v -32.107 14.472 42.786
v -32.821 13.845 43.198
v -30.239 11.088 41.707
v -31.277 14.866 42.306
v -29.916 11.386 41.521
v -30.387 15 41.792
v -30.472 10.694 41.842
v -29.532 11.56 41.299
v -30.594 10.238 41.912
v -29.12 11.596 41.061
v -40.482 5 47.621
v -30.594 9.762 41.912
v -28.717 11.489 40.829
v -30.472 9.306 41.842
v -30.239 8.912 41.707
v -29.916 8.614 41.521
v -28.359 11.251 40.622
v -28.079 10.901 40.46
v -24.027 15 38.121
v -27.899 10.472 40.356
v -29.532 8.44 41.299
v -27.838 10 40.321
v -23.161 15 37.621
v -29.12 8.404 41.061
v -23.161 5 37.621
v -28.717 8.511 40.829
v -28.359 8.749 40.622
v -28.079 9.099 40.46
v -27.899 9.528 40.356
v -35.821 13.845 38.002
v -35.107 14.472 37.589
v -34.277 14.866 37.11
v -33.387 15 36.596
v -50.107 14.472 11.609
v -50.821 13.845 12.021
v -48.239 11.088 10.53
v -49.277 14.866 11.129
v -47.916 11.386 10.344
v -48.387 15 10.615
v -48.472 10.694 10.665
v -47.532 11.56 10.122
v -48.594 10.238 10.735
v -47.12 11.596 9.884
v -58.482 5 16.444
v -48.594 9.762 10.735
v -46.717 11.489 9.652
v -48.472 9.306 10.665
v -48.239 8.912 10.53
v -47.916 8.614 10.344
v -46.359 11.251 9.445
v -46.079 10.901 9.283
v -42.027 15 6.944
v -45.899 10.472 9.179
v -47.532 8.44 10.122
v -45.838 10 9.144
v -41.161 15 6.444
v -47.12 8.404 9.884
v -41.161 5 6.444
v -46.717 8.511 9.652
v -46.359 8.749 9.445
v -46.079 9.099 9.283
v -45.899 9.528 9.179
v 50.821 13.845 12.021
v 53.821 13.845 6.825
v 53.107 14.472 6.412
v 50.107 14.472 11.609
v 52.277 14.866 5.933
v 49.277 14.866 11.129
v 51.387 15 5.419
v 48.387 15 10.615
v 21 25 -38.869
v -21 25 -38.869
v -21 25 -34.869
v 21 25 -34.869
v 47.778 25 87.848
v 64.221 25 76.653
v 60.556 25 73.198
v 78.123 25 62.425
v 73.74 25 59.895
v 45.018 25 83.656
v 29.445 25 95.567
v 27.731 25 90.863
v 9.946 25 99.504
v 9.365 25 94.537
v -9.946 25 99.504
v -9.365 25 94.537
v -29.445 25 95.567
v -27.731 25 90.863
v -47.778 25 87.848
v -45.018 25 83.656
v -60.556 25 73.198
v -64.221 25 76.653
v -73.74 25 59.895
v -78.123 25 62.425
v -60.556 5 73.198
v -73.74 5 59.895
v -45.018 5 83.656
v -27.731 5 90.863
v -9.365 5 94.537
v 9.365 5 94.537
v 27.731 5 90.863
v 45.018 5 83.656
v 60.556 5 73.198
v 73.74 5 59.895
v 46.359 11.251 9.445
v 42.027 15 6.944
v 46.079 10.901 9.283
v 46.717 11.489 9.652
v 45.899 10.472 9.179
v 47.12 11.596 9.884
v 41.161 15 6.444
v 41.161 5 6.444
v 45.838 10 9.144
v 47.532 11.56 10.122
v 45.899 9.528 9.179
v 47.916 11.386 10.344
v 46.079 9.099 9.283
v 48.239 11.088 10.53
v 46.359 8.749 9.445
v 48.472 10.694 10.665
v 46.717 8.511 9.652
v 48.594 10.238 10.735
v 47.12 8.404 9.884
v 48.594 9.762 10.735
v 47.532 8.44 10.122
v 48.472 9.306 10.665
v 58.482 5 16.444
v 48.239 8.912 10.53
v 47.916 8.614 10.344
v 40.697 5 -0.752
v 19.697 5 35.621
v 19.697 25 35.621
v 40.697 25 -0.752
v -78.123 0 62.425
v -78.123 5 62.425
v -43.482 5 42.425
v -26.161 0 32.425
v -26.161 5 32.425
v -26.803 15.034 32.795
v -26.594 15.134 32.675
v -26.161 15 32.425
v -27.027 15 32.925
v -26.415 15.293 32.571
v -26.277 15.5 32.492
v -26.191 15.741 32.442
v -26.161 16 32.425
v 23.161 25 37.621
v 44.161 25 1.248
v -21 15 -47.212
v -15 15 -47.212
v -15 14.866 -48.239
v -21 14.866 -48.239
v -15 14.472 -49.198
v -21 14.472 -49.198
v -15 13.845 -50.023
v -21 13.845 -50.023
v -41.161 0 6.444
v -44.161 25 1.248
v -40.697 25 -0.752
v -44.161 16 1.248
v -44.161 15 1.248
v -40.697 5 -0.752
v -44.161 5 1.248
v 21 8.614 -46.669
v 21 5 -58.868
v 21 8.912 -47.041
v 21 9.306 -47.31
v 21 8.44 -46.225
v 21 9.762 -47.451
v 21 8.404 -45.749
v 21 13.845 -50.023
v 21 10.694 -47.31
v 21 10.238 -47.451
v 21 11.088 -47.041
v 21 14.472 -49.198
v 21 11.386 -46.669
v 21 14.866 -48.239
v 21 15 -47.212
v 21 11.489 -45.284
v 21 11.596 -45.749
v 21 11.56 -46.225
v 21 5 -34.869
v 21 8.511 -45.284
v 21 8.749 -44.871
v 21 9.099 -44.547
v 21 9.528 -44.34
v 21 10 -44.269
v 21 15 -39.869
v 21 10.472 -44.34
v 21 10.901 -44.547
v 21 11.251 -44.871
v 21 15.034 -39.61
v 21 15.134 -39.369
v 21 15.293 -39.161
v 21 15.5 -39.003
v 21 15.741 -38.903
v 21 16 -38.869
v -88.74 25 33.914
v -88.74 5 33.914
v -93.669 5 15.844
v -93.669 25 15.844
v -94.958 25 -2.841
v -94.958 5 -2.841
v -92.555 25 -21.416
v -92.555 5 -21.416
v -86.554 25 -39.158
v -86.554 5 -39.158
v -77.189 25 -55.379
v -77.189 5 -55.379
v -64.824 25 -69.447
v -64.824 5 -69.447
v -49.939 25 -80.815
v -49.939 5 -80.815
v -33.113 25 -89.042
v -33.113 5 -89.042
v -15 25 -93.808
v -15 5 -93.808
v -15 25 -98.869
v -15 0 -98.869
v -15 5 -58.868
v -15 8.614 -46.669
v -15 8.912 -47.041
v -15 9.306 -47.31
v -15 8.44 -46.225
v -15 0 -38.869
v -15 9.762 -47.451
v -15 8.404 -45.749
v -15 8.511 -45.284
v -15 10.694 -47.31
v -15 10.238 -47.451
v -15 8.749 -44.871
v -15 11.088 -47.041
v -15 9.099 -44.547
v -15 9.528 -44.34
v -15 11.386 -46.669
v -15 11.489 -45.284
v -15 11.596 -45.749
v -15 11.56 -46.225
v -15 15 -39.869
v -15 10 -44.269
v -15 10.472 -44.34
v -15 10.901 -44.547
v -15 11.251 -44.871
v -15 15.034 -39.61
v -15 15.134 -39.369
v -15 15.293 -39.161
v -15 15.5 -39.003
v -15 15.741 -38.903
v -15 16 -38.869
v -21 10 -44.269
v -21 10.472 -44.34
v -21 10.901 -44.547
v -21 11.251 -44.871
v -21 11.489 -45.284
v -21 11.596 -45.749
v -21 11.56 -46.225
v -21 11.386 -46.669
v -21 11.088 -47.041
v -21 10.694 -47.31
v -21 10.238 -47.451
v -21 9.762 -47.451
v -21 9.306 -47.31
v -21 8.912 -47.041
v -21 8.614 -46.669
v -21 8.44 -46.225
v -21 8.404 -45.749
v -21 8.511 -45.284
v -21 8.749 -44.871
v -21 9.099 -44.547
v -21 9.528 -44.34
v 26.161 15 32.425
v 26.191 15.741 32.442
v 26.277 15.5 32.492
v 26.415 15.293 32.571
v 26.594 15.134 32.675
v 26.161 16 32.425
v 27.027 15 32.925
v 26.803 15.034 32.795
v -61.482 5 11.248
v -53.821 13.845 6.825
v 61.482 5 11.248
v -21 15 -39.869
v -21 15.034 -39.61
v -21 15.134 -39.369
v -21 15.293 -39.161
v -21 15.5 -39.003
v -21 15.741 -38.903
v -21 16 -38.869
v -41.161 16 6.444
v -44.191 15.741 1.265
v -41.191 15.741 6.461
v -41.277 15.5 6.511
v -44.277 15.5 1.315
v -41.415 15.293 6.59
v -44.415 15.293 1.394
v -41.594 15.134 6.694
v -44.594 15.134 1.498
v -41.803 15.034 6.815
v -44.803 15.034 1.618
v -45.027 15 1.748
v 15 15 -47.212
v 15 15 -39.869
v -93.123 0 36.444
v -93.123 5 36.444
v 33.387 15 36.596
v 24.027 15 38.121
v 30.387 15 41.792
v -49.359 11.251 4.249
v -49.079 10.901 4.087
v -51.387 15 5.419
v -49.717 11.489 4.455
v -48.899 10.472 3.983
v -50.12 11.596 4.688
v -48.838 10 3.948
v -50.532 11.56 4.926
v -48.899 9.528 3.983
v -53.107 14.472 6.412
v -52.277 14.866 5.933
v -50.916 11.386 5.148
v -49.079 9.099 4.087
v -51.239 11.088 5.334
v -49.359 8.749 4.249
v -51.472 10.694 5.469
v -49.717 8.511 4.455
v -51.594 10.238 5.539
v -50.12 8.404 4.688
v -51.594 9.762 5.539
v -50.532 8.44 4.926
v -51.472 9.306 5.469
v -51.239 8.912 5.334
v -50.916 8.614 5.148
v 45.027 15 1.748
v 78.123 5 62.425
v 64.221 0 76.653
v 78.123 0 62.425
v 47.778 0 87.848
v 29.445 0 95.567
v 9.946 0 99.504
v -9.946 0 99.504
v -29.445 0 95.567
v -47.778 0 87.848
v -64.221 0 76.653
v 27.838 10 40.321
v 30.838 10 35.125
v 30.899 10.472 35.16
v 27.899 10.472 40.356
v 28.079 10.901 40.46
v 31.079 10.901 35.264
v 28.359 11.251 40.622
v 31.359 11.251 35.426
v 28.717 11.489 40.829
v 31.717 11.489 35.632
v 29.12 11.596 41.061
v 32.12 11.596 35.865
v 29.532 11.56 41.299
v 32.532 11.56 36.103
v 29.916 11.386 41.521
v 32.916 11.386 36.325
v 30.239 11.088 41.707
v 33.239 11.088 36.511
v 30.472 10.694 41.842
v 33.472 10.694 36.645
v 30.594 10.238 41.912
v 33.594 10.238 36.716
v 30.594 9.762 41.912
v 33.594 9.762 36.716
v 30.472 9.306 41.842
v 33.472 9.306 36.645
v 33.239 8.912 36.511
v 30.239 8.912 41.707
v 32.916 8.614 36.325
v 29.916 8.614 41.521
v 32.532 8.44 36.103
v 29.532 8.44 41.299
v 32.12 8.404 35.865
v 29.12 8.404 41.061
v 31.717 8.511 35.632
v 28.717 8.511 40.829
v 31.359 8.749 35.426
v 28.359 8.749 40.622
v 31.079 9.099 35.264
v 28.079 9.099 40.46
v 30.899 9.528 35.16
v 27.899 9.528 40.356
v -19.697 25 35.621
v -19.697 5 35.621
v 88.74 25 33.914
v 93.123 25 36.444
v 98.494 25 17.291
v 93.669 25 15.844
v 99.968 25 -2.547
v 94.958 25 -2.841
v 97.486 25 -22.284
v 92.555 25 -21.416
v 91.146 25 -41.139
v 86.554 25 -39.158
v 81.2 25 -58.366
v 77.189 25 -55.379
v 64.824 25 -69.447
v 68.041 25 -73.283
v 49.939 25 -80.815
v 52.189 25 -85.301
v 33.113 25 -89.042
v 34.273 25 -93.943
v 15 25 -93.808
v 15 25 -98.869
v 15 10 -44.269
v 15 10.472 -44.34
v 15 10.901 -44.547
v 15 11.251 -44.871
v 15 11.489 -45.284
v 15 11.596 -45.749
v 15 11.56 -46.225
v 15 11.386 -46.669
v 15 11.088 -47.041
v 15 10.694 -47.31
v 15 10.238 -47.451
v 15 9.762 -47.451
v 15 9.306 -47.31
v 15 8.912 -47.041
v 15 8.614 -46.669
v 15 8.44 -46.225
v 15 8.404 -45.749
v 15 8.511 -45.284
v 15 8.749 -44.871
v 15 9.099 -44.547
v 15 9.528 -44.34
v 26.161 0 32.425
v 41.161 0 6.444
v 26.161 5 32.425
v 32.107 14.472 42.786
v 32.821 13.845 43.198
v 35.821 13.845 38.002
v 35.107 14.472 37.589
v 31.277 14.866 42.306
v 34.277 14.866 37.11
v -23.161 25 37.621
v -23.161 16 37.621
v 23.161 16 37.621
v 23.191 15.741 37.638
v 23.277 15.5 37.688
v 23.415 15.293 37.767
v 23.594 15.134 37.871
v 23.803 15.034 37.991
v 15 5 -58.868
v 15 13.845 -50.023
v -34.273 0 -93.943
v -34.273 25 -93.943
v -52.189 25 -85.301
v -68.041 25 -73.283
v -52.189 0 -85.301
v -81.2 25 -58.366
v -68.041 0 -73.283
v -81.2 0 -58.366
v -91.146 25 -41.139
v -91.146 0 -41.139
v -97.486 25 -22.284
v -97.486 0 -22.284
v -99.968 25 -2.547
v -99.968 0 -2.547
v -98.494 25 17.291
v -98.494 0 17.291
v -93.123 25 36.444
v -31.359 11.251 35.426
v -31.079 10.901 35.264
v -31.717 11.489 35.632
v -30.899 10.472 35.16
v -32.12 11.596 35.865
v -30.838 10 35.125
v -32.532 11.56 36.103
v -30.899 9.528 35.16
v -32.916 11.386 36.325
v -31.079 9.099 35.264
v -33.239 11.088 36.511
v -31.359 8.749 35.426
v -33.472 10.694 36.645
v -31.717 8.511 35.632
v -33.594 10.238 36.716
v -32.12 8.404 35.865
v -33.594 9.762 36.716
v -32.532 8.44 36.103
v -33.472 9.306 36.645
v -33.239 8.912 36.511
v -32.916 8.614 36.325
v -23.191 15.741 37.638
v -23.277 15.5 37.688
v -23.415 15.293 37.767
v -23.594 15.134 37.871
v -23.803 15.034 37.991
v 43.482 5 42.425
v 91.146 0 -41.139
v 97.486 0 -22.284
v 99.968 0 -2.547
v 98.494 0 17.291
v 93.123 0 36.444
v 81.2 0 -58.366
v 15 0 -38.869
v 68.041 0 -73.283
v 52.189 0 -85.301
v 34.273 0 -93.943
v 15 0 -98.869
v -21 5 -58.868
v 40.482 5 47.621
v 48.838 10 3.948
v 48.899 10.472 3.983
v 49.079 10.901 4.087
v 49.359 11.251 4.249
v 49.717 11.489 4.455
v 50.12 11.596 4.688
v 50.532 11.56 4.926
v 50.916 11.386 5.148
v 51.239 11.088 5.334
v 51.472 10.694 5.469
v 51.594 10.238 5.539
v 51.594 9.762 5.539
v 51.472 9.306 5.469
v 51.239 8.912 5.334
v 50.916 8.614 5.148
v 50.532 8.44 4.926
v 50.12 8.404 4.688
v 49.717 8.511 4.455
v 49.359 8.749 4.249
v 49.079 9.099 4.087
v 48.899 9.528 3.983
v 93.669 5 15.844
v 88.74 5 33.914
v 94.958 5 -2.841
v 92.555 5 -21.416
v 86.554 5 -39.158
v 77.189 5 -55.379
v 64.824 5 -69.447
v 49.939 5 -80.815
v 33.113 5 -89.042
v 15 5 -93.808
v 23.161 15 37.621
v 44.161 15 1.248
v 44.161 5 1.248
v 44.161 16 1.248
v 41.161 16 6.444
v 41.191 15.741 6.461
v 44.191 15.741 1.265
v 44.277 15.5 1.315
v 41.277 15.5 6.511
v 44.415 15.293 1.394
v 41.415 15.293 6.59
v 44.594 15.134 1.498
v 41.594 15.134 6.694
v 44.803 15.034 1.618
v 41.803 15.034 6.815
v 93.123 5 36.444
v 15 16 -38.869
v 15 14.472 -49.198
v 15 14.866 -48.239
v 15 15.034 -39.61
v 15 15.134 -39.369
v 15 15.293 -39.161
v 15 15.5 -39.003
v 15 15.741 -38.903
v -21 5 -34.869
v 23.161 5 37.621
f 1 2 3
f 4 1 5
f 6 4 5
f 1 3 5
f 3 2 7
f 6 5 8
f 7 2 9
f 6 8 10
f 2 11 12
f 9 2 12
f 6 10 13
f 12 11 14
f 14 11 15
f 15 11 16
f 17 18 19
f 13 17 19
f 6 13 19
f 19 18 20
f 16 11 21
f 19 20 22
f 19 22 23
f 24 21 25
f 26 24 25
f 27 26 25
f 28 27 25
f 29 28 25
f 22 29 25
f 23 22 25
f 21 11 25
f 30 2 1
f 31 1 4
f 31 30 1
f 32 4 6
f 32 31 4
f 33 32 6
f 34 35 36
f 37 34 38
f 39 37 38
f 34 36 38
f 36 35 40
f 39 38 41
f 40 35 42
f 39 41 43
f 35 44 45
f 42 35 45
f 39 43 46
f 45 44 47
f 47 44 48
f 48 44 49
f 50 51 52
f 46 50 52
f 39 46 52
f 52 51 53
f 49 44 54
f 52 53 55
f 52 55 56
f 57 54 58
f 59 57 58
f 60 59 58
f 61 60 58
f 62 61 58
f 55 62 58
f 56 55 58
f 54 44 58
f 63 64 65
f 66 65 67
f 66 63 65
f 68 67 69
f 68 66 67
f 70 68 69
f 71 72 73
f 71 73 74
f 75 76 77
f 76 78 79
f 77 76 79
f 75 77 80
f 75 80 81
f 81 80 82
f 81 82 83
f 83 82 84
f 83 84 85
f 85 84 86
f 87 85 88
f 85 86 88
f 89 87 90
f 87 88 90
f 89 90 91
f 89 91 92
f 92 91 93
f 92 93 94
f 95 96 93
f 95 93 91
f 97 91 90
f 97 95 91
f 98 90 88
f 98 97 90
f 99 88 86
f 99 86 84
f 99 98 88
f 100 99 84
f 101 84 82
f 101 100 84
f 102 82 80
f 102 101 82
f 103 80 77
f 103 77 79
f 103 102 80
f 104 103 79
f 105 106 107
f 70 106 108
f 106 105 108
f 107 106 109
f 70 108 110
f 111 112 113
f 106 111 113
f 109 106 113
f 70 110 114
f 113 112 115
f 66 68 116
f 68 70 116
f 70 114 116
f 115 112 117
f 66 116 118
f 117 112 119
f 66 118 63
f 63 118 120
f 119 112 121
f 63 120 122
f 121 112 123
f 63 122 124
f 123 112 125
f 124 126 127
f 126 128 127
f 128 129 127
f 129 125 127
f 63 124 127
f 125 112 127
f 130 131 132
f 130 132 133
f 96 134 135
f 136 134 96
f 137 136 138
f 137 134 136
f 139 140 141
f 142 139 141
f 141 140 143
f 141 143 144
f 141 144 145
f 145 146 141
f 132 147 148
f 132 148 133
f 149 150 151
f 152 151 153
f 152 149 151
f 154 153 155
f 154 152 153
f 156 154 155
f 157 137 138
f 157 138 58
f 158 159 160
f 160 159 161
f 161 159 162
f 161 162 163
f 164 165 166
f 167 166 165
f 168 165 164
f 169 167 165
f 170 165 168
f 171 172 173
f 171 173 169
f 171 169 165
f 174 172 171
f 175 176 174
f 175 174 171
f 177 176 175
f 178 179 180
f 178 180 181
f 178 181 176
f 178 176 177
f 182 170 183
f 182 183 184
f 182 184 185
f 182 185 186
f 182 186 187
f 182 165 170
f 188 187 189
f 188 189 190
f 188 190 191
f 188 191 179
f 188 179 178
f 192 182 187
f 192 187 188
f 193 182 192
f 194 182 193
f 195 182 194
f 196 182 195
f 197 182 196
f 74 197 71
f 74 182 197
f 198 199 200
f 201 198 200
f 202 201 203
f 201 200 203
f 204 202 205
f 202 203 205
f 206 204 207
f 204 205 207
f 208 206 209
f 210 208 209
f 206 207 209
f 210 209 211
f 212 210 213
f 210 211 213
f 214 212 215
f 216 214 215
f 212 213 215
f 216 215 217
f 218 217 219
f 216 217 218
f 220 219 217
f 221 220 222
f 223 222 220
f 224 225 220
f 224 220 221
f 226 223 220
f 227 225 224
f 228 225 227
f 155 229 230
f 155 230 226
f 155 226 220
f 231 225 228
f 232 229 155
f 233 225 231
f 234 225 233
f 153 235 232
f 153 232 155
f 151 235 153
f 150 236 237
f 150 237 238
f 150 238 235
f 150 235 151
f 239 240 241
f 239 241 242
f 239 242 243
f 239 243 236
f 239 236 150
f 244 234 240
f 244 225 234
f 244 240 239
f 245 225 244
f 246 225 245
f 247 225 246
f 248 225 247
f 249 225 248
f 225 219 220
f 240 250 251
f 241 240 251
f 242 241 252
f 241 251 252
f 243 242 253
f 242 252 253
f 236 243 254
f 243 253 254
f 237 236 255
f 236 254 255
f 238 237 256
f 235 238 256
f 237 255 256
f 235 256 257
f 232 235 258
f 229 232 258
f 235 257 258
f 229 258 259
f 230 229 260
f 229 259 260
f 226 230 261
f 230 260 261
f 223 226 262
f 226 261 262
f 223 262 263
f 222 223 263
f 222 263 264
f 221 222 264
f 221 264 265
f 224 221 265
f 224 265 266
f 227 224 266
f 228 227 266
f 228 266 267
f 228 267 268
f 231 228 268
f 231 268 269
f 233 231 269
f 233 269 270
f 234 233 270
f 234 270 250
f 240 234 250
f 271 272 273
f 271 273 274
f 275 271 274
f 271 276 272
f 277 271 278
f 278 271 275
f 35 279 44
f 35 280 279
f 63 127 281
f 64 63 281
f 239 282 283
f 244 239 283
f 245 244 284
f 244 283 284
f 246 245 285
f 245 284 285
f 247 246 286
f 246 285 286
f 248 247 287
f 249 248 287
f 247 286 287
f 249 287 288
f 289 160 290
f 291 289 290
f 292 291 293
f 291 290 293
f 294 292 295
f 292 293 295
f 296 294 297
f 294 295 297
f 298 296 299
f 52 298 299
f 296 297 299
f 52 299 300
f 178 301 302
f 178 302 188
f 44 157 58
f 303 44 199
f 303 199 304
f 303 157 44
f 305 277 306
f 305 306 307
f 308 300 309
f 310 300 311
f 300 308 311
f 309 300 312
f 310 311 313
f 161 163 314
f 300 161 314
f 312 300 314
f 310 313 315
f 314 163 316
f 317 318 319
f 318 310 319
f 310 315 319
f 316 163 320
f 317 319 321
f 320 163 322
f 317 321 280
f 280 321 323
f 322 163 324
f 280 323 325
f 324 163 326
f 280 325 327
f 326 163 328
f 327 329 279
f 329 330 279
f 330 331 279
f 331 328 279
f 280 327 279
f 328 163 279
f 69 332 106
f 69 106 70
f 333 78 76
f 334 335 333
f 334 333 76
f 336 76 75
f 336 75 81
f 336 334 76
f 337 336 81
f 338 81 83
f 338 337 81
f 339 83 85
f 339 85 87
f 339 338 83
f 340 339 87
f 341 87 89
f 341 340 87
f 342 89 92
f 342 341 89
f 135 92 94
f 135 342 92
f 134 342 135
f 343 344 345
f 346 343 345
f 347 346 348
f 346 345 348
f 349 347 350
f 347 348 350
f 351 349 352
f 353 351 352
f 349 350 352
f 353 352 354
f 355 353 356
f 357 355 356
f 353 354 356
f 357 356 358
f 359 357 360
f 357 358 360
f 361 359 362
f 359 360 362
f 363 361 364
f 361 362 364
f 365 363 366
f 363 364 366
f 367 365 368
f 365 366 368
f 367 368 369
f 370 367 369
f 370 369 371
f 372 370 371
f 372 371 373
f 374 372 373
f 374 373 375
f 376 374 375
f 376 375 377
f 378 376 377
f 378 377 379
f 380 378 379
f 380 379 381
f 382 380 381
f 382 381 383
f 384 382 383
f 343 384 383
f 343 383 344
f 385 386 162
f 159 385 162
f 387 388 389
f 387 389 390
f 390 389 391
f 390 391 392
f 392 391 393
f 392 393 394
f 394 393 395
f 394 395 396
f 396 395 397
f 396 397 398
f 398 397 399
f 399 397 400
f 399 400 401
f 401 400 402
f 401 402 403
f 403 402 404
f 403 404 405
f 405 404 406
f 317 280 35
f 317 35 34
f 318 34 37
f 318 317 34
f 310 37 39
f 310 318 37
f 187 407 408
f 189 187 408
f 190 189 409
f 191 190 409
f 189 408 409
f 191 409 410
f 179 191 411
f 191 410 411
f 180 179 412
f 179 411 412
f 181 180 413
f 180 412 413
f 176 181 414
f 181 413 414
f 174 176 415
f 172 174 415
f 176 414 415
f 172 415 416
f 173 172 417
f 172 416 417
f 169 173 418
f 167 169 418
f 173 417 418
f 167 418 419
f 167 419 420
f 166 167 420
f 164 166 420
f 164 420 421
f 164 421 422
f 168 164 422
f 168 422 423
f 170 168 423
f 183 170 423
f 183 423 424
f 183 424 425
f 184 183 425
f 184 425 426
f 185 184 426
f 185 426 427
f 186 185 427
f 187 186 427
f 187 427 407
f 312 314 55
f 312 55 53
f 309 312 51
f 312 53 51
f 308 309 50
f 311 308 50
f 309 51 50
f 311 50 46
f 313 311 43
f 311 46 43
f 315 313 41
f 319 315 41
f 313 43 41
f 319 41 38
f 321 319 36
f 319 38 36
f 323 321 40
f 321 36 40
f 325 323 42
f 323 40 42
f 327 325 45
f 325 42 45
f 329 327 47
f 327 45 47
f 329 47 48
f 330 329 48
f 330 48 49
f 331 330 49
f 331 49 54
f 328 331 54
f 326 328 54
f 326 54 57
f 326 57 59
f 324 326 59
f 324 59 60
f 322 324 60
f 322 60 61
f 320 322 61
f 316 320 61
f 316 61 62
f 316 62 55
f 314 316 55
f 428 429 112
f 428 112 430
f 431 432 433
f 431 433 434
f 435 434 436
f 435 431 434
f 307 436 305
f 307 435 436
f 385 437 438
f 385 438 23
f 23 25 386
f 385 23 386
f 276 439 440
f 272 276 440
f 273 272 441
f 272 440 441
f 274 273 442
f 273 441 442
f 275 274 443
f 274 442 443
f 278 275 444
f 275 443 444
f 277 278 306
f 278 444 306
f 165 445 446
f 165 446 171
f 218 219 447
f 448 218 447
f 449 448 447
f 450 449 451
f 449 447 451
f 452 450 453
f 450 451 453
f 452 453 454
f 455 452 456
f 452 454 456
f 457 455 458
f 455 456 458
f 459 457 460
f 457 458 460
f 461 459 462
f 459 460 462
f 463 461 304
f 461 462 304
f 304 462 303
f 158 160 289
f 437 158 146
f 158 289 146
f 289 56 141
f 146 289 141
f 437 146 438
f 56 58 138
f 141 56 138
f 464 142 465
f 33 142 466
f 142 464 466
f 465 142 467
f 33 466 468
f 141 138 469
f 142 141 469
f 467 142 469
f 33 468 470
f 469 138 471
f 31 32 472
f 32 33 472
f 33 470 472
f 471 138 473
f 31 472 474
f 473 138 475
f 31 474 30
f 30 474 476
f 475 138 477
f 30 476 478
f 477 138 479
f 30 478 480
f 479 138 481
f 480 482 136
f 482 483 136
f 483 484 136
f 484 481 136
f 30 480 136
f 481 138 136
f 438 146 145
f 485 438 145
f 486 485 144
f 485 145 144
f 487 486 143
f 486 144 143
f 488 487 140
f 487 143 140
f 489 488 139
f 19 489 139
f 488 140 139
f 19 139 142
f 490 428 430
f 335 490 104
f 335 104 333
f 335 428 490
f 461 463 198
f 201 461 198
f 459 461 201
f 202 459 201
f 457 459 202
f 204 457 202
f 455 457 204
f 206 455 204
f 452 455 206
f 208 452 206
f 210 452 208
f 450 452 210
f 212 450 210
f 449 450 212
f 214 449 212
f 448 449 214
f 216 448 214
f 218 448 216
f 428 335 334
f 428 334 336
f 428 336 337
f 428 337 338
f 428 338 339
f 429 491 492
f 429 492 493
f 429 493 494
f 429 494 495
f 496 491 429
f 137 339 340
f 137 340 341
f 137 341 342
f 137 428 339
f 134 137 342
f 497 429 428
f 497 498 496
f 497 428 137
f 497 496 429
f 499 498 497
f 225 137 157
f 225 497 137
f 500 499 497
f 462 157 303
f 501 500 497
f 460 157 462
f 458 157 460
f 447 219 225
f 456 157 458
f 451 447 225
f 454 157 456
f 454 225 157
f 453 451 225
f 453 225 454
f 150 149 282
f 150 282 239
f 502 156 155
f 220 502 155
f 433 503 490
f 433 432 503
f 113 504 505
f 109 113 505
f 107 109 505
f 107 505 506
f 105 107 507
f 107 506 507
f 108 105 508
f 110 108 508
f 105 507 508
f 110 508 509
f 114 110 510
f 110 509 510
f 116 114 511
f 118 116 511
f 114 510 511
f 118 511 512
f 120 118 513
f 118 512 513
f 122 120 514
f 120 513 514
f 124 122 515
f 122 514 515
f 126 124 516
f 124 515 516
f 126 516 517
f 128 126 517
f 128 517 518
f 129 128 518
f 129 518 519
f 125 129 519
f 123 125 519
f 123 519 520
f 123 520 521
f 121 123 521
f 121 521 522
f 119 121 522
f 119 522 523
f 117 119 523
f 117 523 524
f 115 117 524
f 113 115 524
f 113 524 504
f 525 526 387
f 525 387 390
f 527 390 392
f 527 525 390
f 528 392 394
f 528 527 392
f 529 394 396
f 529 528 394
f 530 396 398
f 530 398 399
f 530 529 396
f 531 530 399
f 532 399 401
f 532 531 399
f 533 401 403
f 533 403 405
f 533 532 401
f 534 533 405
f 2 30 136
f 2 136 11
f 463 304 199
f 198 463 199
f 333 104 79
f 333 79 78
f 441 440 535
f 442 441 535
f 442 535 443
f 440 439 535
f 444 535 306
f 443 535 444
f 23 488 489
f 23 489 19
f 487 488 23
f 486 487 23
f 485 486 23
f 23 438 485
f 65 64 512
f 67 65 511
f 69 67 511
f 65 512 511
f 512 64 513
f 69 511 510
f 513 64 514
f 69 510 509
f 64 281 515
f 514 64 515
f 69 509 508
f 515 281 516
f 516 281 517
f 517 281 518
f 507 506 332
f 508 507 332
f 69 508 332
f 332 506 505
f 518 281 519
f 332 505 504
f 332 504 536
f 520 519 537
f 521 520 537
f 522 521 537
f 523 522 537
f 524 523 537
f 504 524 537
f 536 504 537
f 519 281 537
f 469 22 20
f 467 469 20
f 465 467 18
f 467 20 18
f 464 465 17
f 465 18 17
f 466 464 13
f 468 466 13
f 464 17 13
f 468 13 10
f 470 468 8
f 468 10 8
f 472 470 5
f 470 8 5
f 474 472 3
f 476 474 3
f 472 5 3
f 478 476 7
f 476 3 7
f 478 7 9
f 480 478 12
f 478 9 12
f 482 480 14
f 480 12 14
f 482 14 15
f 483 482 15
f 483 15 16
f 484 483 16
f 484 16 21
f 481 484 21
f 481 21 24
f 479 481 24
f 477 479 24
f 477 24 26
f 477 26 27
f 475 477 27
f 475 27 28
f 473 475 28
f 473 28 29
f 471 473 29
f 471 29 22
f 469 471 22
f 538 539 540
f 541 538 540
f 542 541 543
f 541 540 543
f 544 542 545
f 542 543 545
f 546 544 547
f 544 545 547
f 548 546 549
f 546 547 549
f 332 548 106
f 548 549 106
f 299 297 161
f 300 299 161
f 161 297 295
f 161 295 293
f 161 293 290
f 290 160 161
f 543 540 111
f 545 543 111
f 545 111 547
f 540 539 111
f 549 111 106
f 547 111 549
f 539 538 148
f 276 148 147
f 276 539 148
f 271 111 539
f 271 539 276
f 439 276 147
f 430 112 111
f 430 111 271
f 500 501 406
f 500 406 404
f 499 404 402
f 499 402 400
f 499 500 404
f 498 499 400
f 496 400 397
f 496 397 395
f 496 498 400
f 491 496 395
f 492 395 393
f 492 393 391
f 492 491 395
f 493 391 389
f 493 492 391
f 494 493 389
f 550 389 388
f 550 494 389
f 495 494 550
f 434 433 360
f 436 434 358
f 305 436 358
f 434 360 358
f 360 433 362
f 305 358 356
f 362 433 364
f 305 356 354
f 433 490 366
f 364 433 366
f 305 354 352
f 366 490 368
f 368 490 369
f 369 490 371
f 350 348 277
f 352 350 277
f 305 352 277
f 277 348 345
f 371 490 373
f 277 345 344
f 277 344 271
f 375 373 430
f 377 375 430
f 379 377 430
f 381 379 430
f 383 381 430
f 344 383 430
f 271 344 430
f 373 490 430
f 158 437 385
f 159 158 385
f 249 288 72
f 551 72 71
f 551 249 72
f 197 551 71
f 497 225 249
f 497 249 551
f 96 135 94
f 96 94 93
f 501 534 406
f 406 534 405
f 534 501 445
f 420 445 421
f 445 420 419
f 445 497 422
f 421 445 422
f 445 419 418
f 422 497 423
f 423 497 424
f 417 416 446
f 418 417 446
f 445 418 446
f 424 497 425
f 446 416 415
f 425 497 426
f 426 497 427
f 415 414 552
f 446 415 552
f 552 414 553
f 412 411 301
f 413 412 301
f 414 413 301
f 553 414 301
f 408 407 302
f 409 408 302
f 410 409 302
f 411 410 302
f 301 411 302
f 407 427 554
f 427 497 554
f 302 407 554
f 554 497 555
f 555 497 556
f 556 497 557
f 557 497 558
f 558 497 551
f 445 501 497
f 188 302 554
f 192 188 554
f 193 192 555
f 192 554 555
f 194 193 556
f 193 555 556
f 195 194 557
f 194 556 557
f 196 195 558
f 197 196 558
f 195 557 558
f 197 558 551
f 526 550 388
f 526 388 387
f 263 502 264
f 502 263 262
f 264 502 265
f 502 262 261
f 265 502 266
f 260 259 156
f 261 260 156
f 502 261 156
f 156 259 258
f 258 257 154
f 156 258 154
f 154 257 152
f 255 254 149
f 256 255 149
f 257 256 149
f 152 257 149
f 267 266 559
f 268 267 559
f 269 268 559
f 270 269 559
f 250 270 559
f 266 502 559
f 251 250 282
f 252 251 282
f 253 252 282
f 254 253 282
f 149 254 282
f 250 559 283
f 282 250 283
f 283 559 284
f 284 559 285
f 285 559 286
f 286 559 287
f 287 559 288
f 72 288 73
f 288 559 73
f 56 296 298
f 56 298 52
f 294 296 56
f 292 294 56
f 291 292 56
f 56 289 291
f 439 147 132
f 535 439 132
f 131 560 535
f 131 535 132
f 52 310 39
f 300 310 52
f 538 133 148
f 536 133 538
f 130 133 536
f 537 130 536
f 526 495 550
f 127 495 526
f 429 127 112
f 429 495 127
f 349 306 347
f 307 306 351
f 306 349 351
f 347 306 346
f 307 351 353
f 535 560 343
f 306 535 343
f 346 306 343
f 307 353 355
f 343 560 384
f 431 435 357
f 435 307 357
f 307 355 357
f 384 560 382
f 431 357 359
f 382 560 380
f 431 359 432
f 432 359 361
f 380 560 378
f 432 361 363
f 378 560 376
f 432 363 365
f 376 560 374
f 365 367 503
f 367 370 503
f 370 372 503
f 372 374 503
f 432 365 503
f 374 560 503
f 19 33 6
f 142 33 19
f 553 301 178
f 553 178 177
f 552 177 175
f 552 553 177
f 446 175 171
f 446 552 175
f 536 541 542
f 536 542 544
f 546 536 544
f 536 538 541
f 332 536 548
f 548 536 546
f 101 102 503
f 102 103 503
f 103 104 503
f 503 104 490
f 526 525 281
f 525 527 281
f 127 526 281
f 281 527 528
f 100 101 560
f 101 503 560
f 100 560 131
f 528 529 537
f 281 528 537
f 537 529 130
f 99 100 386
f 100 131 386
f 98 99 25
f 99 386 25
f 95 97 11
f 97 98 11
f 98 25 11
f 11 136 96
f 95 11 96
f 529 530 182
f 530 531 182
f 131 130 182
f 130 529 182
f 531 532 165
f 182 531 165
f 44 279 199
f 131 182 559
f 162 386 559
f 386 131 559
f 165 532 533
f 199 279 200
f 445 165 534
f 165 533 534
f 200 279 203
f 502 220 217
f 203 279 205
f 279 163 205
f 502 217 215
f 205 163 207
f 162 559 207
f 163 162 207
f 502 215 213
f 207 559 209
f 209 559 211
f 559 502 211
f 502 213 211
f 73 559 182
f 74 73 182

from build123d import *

# Parameters (mm, degrees)
AUFSATZ_LINEAR_AUSTRAGEN1_DEPTH = 5
SKIZZE2_W                       = 6
SKIZZE2_H                       = 10
AUFSATZ_LINEAR_AUSTRAGEN2_DEPTH = 10
FASE1_SIZE                      = 10
SKIZZE3_R                       = 1.6
SCHNITT_LINEAR_AUSTRAGEN1_DEPTH = 42
SKIZZE4_W                       = 42
SKIZZE4_H                       = 4
AUFSATZ_LINEAR_AUSTRAGEN3_DEPTH = 20
KREISMUSTER1_COUNT              = 3
VERRUNDUNG1_START               = -21
VERRUNDUNG1_DEPTH               = 6
VERRUNDUNG1_START_2             = 15
VERRUNDUNG1_2_DEPTH             = 6
VERRUNDUNG1_3_DEPTH             = 6
VERRUNDUNG1_4_DEPTH             = 6
VERRUNDUNG1_5_DEPTH             = 6
VERRUNDUNG1_6_DEPTH             = 6
VERRUNDUNG1_START_3             = -22
VERRUNDUNG1_7_DEPTH             = 44
VERRUNDUNG1_8_DEPTH             = 44
VERRUNDUNG1_9_DEPTH             = 44


with BuildPart() as part:
    # Skizze1 → Aufsatz-Linear austragen1 (new body)
    with BuildSketch(Plane(origin=(0, 0, 0), x_dir=(1, 0, 0), z_dir=(0, 1, 0))):
        with BuildLine():
            Line((93.122718948, -36.443918776), (41.161194721, -6.443918776))
            Line((41.161194721, -6.443918776), (26.161194721, -32.42468089))
            Line((26.161194721, -32.42468089), (78.122718948, -62.42468089))
            ThreePointArc((78.122718948, -62.42468089), (0, -100), (-78.122718948, -62.42468089))
            Line((-78.122718948, -62.42468089), (-26.161194721, -32.42468089))
            Line((-26.161194721, -32.42468089), (-41.161194721, -6.443918776))
            Line((-41.161194721, -6.443918776), (-93.122718948, -36.443918776))
            ThreePointArc((-93.122718948, -36.443918776), (-86.602540378, 50), (-15, 98.868599666))
            Line((-15, 98.868599666), (-15, 38.868599666))
            Line((-15, 38.868599666), (15, 38.868599666))
            Line((15, 38.868599666), (15, 98.868599666))
            ThreePointArc((15, 98.868599666), (86.602540378, 50), (93.122718948, -36.443918776))
        make_face()
    extrude(amount=AUFSATZ_LINEAR_AUSTRAGEN1_DEPTH)

    # Skizze2 → Aufsatz-Linear austragen2 (add)
    with BuildSketch(Plane(origin=(0, 5, 0), x_dir=(1, 0, 0), z_dir=(0, 1, 0))):
        Polygon((49.821448758, -11.443918776), (52.821448758, -6.247766354), (44.161194721, -1.247766354), (41.161194721, -6.443918776), align=None)
        with Locations((-18, 43.868599666)):
            Rectangle(SKIZZE2_W, SKIZZE2_H)
        with Locations((18, 43.868599666)):
            Rectangle(SKIZZE2_W, SKIZZE2_H)
        Polygon((26.161194721, -32.42468089), (23.161194721, -37.620833313), (31.821448758, -42.620833313), (34.821448758, -37.42468089), align=None)
        Polygon((-34.821448758, -37.42468089), (-31.821448758, -42.620833313), (-23.161194721, -37.620833313), (-26.161194721, -32.42468089), align=None)
        Polygon((-41.161194721, -6.443918776), (-44.161194721, -1.247766354), (-52.821448758, -6.247766354), (-49.821448758, -11.443918776), align=None)
    extrude(amount=AUFSATZ_LINEAR_AUSTRAGEN2_DEPTH)

    # Fase1
    fase1_edges = [part.edges().sort_by_distance(p)[0] for p in [
        (-18, 5, -48.868599666),
        (18, 5, -48.868599666),
        (51.321448758, 5, 8.845842565),
        (33.321448758, 5, 40.022757101),
        (-33.321448758, 5, 40.022757101),
        (-51.321448758, 5, 8.845842565),
    ]]
    chamfer(fase1_edges, length=FASE1_SIZE - 0.0001)  # a hair under: the kernel refuses the full size

    # Skizze3 → Schnitt-Linear austragen1 (cut)
    with BuildSketch(Plane(origin=(10.5, 0, 18.186533479), x_dir=(0.8660254037844384, 0, -0.5000000000000007), z_dir=(0.5000000000000006, 0, 0.8660254037844383))):
        with Locations((-45.868599666, 10)):
            Circle(SKIZZE3_R)
    schnitt_linear_austragen1 = extrude(amount=-SCHNITT_LINEAR_AUSTRAGEN1_DEPTH, mode=Mode.SUBTRACT)

    # Skizze4 → Aufsatz-Linear austragen3 (add)
    with BuildSketch(Plane(origin=(0, 5, 0), x_dir=(1, 0, 0), z_dir=(0, 1, 0))):
        with BuildLine():
            Line((-93.122718948, -36.443918776), (-88.740384046, -33.913776541))
            ThreePointArc((-88.740384046, -33.913776541), (-82.27241336, 47.5), (-15, 93.808315196))
            Line((-15, 93.808315196), (-15, 98.868599666))
            ThreePointArc((-15, 98.868599666), (-86.602540378, 50), (-93.122718948, -36.443918776))
        make_face()
        with BuildLine():
            Line((-78.122718948, -62.42468089), (-73.740384046, -59.894538655))
            ThreePointArc((-73.740384046, -59.894538655), (0, -95), (73.740384046, -59.894538655))
            Line((73.740384046, -59.894538655), (78.122718948, -62.42468089))
            ThreePointArc((78.122718948, -62.42468089), (0, -100), (-78.122718948, -62.42468089))
        make_face()
        with BuildLine():
            Line((93.122718948, -36.443918776), (88.740384046, -33.913776541))
            ThreePointArc((88.740384046, -33.913776541), (82.27241336, 47.5), (15, 93.808315196))
            Line((15, 93.808315196), (15, 98.868599666))
            ThreePointArc((15, 98.868599666), (86.602540378, 50), (93.122718948, -36.443918776))
        make_face()
        Polygon((-44.161194721, -1.247766354), (-23.161194721, -37.620833313), (-19.697093106, -35.620833313), (-40.697093106, 0.752233646), align=None)
        with Locations((0, 36.868599666)):
            Rectangle(SKIZZE4_W, SKIZZE4_H)
        Polygon((19.697093106, -35.620833313), (40.697093106, 0.752233646), (44.161194721, -1.247766354), (23.161194721, -37.620833313), align=None)
    extrude(amount=AUFSATZ_LINEAR_AUSTRAGEN3_DEPTH)

    # Kreismuster1: Schnitt-Linear austragen1 ×3 about axis
    kreismuster1_axis = Axis((0, 5, 0), (0, -1, 0))
    for i in range(1, KREISMUSTER1_COUNT):
        add(schnitt_linear_austragen1.rotate(kreismuster1_axis, i * 360 / KREISMUSTER1_COUNT), mode=Mode.SUBTRACT)

    # Verrundung1: read off the stored shape, not the designer's step
    # Verrundung1 outline → Verrundung1 (add)
    with BuildSketch(Plane.YZ.offset(VERRUNDUNG1_START)):
        with BuildLine():
            ThreePointArc((15, -39.868599666), (15.292893219, -39.161492885), (16, -38.868599666))
            Line((16, -38.868599666), (15, -38.868599666))
            Line((15, -38.868599666), (15, -39.868599666))
        make_face()
    extrude(amount=VERRUNDUNG1_DEPTH)

    # Verrundung1 2 outline → Verrundung1 2 (add)
    with BuildSketch(Plane.YZ.offset(VERRUNDUNG1_START_2)):
        with BuildLine():
            ThreePointArc((15, -39.868599666), (15.292893219, -39.161492885), (16, -38.868599666))
            Line((16, -38.868599666), (15, -38.868599666))
            Line((15, -38.868599666), (15, -39.868599666))
        make_face()
    extrude(amount=VERRUNDUNG1_2_DEPTH)

    # Verrundung1 3 outline → Verrundung1 3 (add)
    with BuildSketch(Plane(origin=(0, 0, 0), x_dir=(0.8660254037844386, 0, 0.4999999999999999), z_dir=(0.4999999999999999, 0, -0.8660254037844388)).offset(VERRUNDUNG1_START)):
        with BuildLine():
            Line((38.868599666, -15), (38.868599666, -16))
            ThreePointArc((38.868599666, -16), (39.161492885, -15.292893219), (39.868599666, -15))
            Line((39.868599666, -15), (38.868599666, -15))
        make_face()
    extrude(amount=VERRUNDUNG1_3_DEPTH)

    # Verrundung1 4 outline → Verrundung1 4 (add)
    with BuildSketch(Plane(origin=(0, 0, 0), x_dir=(0.8660254037844386, 0, 0.4999999999999999), z_dir=(0.4999999999999999, 0, -0.8660254037844388)).offset(VERRUNDUNG1_START_2)):
        with BuildLine():
            Line((38.868599666, -15), (38.868599666, -16))
            ThreePointArc((38.868599666, -16), (39.161492885, -15.292893219), (39.868599666, -15))
            Line((39.868599666, -15), (38.868599666, -15))
        make_face()
    extrude(amount=VERRUNDUNG1_4_DEPTH)

    # Verrundung1 5 outline → Verrundung1 5 (add)
    with BuildSketch(Plane(origin=(0, 0, 0), x_dir=(0.8660254037844384, 0, -0.5000000000000003), z_dir=(0.5000000000000003, 0, 0.8660254037844385)).offset(VERRUNDUNG1_START)):
        with BuildLine():
            Line((-38.868599666, 15), (-38.868599666, 16))
            ThreePointArc((-38.868599666, 16), (-39.161492885, 15.292893219), (-39.868599666, 15))
            Line((-39.868599666, 15), (-38.868599666, 15))
        make_face()
    extrude(amount=VERRUNDUNG1_5_DEPTH)

    # Verrundung1 6 outline → Verrundung1 6 (add)
    with BuildSketch(Plane(origin=(0, 0, 0), x_dir=(0.8660254037844384, 0, -0.5000000000000003), z_dir=(0.5000000000000003, 0, 0.8660254037844385)).offset(VERRUNDUNG1_START_2)):
        with BuildLine():
            Line((-38.868599666, 15), (-38.868599666, 16))
            ThreePointArc((-38.868599666, 16), (-39.161492885, 15.292893219), (-39.868599666, 15))
            Line((-39.868599666, 15), (-38.868599666, 15))
        make_face()
    extrude(amount=VERRUNDUNG1_6_DEPTH)

    # Verrundung1 7 outline → Verrundung1 7 (cut)
    with BuildSketch(Plane.YZ.offset(VERRUNDUNG1_START_3)):
        with BuildLine():
            Line((15, -48.868599666), (15, -47.211745417))
            ThreePointArc((15, -47.211745417), (14.69551813, -48.742479146), (13.828427125, -50.040172542))
            Line((13.828427125, -50.040172542), (15, -48.868599666))
        make_face()
    extrude(amount=VERRUNDUNG1_7_DEPTH, mode=Mode.SUBTRACT)

    # Verrundung1 8 outline → Verrundung1 8 (cut)
    with BuildSketch(Plane(origin=(0, 0, 0), x_dir=(0.8660254037844386, 0, 0.4999999999999999), z_dir=(0.4999999999999999, 0, -0.8660254037844388)).offset(VERRUNDUNG1_START_3)):
        with BuildLine():
            ThreePointArc((50.040172542, -13.828427125), (48.742479146, -14.69551813), (47.211745417, -15))
            Line((47.211745417, -15), (48.868599666, -15))
            Line((48.868599666, -15), (50.040172542, -13.828427125))
        make_face()
    extrude(amount=VERRUNDUNG1_8_DEPTH, mode=Mode.SUBTRACT)

    # Verrundung1 9 outline → Verrundung1 9 (cut)
    with BuildSketch(Plane(origin=(0, 0, 0), x_dir=(0.8660254037844384, 0, -0.5000000000000003), z_dir=(0.5000000000000003, 0, 0.8660254037844385)).offset(VERRUNDUNG1_START_3)):
        with BuildLine():
            ThreePointArc((-50.040172542, 13.828427125), (-48.742479146, 14.69551813), (-47.211745417, 15))
            Line((-47.211745417, 15), (-48.868599666, 15))
            Line((-48.868599666, 15), (-50.040172542, 13.828427125))
        make_face()
    extrude(amount=VERRUNDUNG1_9_DEPTH, mode=Mode.SUBTRACT)


solid = part.part
